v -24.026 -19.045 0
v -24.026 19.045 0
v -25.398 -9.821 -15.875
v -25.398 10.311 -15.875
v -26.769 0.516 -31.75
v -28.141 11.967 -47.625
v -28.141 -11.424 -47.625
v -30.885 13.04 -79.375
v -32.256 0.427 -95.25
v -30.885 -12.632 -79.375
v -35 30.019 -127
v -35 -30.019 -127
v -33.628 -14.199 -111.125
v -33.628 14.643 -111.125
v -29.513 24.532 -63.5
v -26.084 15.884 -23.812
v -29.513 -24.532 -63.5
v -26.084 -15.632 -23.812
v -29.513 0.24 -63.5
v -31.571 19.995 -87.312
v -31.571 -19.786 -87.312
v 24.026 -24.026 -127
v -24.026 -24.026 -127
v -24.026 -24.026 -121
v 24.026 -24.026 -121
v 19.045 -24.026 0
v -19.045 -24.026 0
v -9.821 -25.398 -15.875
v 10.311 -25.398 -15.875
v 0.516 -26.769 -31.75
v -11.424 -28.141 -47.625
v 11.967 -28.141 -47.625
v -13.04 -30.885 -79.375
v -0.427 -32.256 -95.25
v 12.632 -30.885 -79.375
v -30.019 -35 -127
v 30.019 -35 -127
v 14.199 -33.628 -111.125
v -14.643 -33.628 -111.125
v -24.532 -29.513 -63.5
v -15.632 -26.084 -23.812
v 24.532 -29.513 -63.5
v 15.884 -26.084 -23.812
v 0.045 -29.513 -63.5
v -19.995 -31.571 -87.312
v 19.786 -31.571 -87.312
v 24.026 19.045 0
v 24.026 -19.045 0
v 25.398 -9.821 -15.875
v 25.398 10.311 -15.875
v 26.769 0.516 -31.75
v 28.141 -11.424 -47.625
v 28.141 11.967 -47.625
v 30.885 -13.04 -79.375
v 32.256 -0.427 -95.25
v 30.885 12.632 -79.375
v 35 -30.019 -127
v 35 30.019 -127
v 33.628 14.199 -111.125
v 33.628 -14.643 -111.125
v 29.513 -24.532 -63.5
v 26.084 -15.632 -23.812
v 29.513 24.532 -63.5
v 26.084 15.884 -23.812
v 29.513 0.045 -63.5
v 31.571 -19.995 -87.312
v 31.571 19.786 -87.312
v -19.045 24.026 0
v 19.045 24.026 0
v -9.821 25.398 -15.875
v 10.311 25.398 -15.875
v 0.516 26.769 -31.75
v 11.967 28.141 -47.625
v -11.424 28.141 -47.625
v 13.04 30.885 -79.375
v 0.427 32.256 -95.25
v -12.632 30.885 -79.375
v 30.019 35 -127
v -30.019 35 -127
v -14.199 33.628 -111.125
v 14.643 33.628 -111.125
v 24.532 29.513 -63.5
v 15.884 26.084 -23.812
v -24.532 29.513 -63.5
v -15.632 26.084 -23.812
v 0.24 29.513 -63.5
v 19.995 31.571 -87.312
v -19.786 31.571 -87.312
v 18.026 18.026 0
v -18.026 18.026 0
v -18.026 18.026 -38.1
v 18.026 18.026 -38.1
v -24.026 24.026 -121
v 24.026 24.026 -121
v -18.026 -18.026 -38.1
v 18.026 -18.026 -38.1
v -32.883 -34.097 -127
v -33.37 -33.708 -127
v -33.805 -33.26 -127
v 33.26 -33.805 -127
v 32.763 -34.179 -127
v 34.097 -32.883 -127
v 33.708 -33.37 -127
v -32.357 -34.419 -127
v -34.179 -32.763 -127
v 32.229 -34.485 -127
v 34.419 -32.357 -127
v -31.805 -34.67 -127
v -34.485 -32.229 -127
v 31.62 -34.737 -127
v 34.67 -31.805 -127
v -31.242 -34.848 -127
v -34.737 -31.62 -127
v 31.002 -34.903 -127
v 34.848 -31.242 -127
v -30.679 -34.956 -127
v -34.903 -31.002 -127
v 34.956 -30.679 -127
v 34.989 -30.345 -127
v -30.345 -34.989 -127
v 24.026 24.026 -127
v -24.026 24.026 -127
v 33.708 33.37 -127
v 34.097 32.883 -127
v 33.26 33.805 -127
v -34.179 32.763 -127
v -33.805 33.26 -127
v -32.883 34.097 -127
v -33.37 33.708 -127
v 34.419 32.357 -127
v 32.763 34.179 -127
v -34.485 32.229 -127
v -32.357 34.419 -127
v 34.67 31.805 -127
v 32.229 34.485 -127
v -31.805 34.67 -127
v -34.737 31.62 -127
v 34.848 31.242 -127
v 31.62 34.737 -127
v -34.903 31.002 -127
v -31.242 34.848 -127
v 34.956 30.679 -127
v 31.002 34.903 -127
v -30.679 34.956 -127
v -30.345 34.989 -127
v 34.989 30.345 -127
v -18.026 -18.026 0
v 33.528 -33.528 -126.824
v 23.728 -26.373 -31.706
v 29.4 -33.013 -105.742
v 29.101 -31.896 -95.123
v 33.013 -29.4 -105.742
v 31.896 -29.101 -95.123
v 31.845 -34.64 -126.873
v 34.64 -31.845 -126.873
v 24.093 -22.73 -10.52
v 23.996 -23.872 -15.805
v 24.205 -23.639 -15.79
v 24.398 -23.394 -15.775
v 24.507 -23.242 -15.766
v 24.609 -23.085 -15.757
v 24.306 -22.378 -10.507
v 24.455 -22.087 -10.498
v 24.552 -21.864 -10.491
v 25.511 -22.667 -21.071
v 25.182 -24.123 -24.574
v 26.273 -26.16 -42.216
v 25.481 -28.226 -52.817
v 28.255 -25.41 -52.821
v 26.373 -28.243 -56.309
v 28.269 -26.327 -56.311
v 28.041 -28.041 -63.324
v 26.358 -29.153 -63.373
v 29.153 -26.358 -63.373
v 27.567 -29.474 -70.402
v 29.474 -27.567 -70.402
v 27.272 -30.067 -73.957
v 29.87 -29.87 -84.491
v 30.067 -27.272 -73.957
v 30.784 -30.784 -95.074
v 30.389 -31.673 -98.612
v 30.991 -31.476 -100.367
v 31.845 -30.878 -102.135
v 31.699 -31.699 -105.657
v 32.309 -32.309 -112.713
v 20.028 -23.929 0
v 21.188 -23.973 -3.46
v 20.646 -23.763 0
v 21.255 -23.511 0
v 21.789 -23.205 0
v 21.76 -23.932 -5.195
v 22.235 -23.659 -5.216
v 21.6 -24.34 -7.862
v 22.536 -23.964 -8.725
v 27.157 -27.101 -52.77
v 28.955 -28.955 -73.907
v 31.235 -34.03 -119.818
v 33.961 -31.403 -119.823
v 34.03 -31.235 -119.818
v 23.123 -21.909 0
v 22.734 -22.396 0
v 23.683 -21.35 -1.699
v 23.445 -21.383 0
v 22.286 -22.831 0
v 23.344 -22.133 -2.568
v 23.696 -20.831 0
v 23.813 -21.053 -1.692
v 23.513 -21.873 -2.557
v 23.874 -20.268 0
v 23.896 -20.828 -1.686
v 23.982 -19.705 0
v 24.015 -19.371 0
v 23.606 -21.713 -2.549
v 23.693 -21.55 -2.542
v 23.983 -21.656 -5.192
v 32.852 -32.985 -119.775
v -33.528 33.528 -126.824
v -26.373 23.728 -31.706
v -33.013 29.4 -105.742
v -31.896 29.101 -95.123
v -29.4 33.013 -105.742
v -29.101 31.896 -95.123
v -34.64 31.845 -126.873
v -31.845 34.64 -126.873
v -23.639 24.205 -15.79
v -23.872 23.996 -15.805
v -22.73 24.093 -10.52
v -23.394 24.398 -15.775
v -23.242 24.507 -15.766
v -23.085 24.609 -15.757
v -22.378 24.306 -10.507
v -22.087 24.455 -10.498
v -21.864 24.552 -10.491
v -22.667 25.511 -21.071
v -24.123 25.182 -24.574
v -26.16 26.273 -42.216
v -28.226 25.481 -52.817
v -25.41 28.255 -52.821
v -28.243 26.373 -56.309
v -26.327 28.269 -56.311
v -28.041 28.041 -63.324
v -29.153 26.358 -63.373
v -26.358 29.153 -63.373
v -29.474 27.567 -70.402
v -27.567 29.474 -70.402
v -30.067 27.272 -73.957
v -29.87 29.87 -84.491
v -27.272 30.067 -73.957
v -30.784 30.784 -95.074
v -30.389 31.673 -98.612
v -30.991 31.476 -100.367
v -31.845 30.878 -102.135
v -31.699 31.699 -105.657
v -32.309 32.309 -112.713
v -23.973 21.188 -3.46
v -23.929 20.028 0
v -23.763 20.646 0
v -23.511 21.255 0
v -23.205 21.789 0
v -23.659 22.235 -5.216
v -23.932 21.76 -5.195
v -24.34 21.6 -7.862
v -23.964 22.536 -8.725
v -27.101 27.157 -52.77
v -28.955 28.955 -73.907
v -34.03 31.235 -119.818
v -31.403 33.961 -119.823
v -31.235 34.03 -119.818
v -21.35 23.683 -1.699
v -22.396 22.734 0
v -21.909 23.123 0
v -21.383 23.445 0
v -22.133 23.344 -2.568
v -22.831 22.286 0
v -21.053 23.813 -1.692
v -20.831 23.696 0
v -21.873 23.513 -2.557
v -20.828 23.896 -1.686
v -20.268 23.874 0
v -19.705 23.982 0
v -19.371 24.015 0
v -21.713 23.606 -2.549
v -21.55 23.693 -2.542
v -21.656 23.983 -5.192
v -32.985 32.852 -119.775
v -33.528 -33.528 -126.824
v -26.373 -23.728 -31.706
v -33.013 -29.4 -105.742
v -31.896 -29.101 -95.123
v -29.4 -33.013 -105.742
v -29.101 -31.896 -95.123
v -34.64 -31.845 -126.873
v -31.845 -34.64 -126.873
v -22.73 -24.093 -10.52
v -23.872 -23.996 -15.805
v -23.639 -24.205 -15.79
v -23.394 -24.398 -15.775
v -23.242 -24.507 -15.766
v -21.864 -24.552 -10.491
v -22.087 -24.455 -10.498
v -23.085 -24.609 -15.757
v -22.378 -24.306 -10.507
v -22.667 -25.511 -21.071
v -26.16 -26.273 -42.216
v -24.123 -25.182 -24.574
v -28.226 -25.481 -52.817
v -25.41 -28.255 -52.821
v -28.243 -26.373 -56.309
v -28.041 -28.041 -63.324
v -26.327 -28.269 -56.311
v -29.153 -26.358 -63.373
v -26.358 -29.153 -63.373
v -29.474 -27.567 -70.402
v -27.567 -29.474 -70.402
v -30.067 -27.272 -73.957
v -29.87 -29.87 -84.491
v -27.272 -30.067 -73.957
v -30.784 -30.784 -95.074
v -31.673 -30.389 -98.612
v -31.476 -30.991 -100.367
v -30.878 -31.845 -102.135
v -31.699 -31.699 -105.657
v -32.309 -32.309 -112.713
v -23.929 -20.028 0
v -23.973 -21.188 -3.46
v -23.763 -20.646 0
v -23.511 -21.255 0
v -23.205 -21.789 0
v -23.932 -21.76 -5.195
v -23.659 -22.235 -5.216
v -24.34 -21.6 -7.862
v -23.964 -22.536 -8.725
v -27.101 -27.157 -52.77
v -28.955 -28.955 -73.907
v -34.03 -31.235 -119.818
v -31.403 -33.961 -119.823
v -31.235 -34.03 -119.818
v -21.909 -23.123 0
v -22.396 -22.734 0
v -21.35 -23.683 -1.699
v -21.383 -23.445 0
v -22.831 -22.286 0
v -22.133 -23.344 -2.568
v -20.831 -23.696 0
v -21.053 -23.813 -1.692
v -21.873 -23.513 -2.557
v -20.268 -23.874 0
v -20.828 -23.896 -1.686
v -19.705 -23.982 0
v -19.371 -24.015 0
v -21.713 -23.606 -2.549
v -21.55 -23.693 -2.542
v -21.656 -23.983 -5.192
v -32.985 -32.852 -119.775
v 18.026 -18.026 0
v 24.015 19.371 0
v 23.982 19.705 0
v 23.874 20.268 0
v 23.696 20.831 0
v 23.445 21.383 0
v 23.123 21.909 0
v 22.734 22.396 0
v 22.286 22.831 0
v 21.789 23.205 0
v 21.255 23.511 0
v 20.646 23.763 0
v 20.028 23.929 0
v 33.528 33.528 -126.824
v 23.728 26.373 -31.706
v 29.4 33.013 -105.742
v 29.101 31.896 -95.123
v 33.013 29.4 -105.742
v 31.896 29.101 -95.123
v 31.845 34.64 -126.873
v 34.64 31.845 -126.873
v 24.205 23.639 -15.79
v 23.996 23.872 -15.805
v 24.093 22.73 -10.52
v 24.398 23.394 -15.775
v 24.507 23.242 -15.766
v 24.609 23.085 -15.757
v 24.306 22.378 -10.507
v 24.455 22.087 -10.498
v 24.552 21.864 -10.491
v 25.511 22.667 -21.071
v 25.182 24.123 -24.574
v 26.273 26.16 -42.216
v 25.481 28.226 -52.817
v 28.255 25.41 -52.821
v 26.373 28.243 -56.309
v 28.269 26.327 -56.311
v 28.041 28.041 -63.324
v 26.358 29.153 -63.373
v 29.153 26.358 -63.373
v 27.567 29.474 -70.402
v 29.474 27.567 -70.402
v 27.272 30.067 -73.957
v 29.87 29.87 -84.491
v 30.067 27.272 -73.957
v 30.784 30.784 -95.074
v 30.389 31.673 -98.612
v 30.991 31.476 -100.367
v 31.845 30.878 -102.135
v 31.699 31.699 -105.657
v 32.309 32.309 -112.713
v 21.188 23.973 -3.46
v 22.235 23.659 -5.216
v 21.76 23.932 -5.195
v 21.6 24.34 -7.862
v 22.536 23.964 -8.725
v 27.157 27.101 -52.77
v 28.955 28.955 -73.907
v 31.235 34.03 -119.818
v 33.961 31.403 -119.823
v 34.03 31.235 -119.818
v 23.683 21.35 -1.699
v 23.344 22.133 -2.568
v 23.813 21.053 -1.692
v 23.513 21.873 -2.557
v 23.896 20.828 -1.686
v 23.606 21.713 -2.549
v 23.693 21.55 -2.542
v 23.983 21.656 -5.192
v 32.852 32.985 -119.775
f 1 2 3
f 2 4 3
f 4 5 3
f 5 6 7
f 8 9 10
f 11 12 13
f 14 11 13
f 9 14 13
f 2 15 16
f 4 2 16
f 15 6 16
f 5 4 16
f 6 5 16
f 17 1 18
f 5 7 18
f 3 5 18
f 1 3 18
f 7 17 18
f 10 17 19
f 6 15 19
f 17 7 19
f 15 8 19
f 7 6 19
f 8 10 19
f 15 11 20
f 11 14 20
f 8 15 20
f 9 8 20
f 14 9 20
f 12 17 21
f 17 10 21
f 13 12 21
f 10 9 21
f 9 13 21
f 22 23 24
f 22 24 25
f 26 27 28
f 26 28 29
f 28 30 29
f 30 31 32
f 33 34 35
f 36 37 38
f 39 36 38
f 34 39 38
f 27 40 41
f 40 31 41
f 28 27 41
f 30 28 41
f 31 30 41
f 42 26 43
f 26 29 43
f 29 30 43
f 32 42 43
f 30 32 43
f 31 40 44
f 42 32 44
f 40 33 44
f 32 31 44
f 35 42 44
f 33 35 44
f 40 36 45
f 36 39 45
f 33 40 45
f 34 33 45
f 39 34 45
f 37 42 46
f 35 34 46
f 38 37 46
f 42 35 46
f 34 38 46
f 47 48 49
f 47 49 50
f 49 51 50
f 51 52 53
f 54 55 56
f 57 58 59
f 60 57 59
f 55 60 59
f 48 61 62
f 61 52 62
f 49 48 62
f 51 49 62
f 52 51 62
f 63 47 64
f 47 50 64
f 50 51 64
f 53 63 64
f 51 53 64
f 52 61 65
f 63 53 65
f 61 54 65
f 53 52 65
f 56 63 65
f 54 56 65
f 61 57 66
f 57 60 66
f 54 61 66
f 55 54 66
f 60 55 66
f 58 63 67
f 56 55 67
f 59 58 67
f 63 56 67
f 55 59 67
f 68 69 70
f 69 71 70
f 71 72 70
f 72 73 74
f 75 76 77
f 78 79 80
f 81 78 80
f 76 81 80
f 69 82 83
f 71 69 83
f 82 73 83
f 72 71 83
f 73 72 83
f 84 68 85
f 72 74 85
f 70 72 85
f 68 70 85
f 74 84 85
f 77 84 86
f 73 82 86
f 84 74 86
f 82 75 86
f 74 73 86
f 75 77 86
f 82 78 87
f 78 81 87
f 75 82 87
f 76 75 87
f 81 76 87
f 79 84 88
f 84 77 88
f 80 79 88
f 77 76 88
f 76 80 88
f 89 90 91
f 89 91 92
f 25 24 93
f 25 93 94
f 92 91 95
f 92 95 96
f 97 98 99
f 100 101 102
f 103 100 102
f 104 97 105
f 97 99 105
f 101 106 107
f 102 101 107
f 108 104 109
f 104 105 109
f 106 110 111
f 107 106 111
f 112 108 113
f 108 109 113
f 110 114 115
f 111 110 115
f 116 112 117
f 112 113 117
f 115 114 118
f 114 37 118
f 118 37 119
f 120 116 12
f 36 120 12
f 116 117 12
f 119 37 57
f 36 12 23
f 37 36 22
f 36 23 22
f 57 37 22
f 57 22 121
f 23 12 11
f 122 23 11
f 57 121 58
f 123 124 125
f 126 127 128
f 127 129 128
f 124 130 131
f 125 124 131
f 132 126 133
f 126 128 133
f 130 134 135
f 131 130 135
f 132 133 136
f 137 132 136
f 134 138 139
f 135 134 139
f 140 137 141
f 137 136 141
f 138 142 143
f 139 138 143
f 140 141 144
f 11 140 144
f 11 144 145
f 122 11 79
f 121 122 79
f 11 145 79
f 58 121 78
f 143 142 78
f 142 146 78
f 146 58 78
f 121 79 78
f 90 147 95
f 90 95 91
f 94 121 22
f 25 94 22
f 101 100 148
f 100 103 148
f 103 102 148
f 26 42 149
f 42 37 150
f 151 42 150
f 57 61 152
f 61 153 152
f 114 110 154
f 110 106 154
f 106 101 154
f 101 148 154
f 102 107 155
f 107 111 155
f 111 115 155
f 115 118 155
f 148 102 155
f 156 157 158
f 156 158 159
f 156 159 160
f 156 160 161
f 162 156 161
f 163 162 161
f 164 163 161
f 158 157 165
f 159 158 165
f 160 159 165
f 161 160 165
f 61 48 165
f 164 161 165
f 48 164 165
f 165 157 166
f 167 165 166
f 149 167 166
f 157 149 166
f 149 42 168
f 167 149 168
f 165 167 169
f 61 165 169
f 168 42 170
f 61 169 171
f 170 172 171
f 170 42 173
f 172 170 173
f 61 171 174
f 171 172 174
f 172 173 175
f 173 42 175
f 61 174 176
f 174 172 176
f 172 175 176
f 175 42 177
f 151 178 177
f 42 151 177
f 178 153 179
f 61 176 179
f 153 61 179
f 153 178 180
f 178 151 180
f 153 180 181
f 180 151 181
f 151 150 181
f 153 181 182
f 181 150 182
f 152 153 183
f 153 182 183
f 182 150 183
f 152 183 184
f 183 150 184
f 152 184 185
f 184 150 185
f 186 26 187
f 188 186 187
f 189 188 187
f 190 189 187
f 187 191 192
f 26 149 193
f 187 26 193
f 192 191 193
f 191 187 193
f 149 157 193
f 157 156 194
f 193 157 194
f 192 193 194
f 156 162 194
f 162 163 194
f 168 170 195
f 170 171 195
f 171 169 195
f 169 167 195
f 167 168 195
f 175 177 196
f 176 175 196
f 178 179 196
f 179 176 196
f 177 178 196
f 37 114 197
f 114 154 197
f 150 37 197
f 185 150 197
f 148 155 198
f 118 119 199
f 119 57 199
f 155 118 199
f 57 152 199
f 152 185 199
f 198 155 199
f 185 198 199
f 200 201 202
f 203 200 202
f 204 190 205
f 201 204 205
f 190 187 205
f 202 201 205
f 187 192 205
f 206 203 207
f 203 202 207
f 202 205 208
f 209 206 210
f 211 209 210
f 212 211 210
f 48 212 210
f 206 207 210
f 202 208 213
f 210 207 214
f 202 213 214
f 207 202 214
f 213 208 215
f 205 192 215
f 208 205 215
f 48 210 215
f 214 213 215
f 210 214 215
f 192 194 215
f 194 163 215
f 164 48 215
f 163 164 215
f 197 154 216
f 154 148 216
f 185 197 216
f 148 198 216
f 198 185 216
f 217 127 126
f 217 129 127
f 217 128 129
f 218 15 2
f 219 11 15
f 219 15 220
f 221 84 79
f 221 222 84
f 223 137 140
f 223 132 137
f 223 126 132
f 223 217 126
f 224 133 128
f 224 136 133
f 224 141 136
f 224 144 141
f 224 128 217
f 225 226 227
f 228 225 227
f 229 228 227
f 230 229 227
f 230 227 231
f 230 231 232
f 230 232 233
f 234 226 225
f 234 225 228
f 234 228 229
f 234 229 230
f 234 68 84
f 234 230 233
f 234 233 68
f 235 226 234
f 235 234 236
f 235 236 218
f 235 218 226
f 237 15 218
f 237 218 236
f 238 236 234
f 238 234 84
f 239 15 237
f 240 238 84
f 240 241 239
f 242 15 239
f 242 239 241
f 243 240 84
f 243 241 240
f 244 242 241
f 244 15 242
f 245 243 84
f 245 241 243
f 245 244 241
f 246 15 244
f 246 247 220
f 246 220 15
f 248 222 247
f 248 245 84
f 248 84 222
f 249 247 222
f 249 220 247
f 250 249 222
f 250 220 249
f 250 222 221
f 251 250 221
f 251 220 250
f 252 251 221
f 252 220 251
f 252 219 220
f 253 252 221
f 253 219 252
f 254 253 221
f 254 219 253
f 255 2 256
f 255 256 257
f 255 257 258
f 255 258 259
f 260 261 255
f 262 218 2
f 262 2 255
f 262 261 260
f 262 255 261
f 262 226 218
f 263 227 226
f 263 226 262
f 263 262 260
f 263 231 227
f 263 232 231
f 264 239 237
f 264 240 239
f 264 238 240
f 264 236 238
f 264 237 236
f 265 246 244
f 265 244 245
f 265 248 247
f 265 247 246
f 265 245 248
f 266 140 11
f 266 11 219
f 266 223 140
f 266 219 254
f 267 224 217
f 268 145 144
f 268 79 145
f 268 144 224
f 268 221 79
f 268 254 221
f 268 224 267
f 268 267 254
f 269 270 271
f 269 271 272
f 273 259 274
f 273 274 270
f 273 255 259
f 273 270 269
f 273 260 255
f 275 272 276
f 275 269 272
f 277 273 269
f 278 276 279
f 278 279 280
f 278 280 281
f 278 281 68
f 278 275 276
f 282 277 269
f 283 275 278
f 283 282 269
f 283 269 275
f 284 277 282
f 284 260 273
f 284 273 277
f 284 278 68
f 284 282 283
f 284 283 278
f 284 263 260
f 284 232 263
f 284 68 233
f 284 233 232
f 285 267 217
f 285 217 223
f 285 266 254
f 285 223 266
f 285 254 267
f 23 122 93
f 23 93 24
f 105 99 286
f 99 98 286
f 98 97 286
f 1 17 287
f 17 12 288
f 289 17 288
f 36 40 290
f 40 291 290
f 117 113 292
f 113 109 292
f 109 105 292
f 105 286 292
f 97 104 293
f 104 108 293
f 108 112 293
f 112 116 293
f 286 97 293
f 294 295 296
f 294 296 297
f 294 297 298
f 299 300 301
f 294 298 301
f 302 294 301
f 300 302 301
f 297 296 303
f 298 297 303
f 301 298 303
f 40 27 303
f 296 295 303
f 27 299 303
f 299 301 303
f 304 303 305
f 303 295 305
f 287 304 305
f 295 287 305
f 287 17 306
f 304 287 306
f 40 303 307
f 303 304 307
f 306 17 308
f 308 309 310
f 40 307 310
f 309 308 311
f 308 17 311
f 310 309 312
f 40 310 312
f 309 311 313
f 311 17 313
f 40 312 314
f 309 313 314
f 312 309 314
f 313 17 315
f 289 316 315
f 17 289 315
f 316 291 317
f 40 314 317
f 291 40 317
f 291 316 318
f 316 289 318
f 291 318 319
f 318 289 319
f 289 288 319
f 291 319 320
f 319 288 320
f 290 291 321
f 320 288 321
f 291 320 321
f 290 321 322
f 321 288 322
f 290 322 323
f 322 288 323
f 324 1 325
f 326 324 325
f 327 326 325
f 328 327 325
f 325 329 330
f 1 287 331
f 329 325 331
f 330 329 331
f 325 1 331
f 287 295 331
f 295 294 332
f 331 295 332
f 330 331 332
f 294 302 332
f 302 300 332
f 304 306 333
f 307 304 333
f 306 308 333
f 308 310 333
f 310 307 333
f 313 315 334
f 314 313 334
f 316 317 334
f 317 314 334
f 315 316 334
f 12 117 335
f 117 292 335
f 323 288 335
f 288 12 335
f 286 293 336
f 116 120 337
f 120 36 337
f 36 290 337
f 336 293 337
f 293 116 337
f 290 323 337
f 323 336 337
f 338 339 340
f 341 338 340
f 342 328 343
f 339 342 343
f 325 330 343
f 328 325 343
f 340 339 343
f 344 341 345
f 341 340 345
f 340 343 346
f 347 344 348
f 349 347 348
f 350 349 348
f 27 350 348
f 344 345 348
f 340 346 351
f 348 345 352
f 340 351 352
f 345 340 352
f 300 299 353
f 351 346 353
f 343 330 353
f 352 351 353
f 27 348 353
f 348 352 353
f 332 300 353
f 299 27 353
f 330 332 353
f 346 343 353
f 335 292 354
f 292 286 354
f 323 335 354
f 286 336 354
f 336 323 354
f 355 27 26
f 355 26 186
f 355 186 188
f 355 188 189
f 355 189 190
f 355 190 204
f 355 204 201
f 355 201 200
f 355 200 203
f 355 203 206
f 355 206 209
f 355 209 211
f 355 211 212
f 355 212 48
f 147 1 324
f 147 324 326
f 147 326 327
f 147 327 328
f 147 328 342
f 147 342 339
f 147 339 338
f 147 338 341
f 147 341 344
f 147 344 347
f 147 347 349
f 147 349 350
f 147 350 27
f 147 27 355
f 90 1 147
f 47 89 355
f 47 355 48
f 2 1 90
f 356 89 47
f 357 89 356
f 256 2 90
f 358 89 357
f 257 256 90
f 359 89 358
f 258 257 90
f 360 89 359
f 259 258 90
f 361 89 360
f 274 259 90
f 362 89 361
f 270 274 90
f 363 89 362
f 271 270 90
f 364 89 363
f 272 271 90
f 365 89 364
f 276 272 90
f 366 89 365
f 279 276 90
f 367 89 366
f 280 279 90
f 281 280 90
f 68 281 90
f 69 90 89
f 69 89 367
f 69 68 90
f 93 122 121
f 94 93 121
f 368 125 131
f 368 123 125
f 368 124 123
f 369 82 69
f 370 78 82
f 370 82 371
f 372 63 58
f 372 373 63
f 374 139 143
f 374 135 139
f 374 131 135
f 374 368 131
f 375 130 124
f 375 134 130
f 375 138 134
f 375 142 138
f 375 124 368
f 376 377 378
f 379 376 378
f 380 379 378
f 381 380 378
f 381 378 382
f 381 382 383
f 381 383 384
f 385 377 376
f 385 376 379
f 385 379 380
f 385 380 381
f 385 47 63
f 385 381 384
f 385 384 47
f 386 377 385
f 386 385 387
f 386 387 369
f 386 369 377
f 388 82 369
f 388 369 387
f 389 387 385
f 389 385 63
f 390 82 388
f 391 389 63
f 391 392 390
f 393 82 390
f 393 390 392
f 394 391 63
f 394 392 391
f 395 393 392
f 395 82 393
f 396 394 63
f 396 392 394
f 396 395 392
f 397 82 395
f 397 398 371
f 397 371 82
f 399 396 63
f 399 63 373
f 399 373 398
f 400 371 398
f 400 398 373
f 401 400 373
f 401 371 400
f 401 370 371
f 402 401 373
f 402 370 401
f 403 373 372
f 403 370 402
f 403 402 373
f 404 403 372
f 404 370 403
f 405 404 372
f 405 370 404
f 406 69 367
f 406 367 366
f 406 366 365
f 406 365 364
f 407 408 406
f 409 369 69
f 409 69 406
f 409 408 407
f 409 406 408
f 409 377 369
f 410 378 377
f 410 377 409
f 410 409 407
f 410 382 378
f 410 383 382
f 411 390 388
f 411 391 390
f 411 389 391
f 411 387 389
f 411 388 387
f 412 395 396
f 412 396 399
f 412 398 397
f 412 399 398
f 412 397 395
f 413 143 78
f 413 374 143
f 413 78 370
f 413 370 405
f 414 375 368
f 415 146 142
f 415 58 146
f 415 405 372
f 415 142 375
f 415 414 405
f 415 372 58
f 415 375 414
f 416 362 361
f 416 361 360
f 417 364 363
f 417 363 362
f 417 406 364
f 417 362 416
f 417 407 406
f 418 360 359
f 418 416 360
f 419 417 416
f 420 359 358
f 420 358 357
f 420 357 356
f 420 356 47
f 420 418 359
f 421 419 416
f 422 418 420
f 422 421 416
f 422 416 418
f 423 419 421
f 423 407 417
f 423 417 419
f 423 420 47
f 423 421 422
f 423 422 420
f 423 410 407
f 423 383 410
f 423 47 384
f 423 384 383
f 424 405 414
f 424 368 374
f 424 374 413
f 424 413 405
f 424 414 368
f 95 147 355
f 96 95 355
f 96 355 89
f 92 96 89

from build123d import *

# Parameters (mm, degrees)
F0_W     = 48.052
F0_H     = 48.052
F2_W     = 70
F2_H     = 70
F4_W     = 36.052
F4_H     = 36.052
F5_DEPTH = 38.1
F6_R     = 5
F7_W     = 48.052
F7_H     = 48.052
F8_DEPTH = 6


with BuildPart() as f3:
    # F0 (on Top) → F3 section 0
    with BuildSketch(Plane.XY):
        Rectangle(F0_W, F0_H)
    # F2 (on offset) → F3 section 1
    with BuildSketch(Plane.XY.offset(-127)):
        Rectangle(F2_W, F2_H)
    loft()

    # F4 (on face) → F5 (cut)
    with BuildSketch(Plane.XY):
        Rectangle(F4_W, F4_H)
    extrude(amount=-F5_DEPTH, mode=Mode.SUBTRACT)

    # F6
    f6_edges = [f3.edges().sort_by_distance(p)[0] for p in [
        (-29.513, -29.513, -63.5),
        (29.513, -29.513, -63.5),
        (-29.513, 29.513, -63.5),
        (29.513, 29.513, -63.5),
    ]]
    fillet(f6_edges, radius=F6_R)

    # F7 (on face) → F8 (cut)
    with BuildSketch(Plane(origin=(0, 0, -127), x_dir=(1, 0, 0), z_dir=(0, 0, -1))):
        Rectangle(F7_W, F7_H)
    extrude(amount=-F8_DEPTH, mode=Mode.SUBTRACT)


solid = f3.part
